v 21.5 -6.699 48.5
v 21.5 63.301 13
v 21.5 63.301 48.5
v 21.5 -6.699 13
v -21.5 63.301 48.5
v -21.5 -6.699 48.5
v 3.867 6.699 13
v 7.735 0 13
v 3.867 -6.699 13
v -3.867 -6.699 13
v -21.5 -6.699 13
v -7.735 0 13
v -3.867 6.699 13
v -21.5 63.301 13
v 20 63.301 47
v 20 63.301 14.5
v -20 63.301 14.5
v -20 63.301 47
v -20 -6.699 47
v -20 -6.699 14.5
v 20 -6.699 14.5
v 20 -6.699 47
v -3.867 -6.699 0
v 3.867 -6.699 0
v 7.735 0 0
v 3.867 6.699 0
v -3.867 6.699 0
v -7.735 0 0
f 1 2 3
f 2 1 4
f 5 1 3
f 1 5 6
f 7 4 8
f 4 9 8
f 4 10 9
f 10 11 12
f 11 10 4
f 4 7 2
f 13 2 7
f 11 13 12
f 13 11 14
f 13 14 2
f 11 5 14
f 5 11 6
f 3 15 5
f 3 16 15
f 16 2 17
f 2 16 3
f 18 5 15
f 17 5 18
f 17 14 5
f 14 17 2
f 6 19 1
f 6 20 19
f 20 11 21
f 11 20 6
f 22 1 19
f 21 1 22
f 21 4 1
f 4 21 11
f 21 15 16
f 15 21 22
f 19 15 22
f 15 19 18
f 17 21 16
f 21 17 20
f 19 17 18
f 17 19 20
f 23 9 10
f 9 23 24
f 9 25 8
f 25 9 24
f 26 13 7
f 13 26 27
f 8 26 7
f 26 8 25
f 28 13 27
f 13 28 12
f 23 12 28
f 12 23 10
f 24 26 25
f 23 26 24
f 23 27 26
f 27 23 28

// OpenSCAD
/*
Parametric loop for HSW

Copyright 2024 nomike[AT]nomike[DOT]com

Redistribution and use in source and binary forms, with or without
modification, are permitted provided that the following conditions are met:

1. Redistributions of source code must retain the above copyright notice, this
list of conditions and the following disclaimer.

2. Redistributions in binary form must reproduce the above copyright notice,
this list of conditions and the following disclaimer in the documentation
and/or other materials provided with the distribution.

THIS SOFTWARE IS PROVIDED BY THE COPYRIGHT HOLDERS AND CONTRIBUTORS “AS IS” AND
ANY EXPRESS OR IMPLIED WARRANTIES, INCLUDING, BUT NOT LIMITED TO, THE IMPLIED
WARRANTIES OF MERCHANTABILITY AND FITNESS FOR A PARTICULAR PURPOSE ARE
DISCLAIMED. IN NO EVENT SHALL THE COPYRIGHT HOLDER OR CONTRIBUTORS BE LIABLE FOR
ANY DIRECT, INDIRECT, INCIDENTAL, SPECIAL, EXEMPLARY, OR CONSEQUENTIAL DAMAGES
(INCLUDING, BUT NOT LIMITED TO, PROCUREMENT OF SUBSTITUTE GOODS OR SERVICES;
LOSS OF USE, DATA, OR PROFITS; OR BUSINESS INTERRUPTION) HOWEVER CAUSED AND ON
ANY THEORY OF LIABILITY, WHETHER IN CONTRACT, STRICT LIABILITY, OR TORT
(INCLUDING NEGLIGENCE OR OTHERWISE) ARISING IN ANY WAY OUT OF THE USE OF THIS
SOFTWARE, EVEN IF ADVISED OF THE POSSIBILITY OF SUCH DAMAGE.
*/


hsw_insert_length = 13;
hole_length = 40;
hole_width = 32.5;
loop_height = 70;
wall_thickness = 1.5;
closed_bottom = false;

/*
The front-cutout can either be represented by a percentage or by an absolute width.
Just comment/uncomment the next three lines accordingly.
Set it to 0 to not have a cutout.
*/
front_cutout_witdh_percent = 0;
front_cutout_width = (hole_length - (2 * wall_thickness)) * (front_cutout_witdh_percent / 100);
//front_cutout_width = 36;

front_cutout_bottom_lip = 10;
front_cutout_depth = 10;
front_cutout_height = loop_height - front_cutout_bottom_lip;

loop_width = hole_length + wall_thickness * 2;
loop_length = hole_width + wall_thickness * 2;

const_hsw_diameter = 15.47; // 15.15 mm hooks slide in and out with ease. 15.47 mm is quite tight.
_hsw_inner_circle_diameter = (sqrt(3) / 2) * const_hsw_diameter;


// HSW insert
cylinder(d=const_hsw_diameter, h=hsw_insert_length, $fn=6);

loop_y_shift = 0;

// Loop
translate([0, 0 - (_hsw_inner_circle_diameter / 2) + (loop_height / 2), (loop_length / 2) + hsw_insert_length])
difference() {
    cube([loop_width, loop_height, loop_length], center=true);
    translate([0, closed_bottom ? wall_thickness : 0, 0]) cube([hole_length, closed_bottom ? loop_height : loop_height, hole_width], center=true);
    translate([0, -loop_height / 2 + front_cutout_height / 2 + front_cutout_bottom_lip, wall_thickness/2 + hole_width / 2]) cube([front_cutout_width, front_cutout_height, wall_thickness], center=true);
}
